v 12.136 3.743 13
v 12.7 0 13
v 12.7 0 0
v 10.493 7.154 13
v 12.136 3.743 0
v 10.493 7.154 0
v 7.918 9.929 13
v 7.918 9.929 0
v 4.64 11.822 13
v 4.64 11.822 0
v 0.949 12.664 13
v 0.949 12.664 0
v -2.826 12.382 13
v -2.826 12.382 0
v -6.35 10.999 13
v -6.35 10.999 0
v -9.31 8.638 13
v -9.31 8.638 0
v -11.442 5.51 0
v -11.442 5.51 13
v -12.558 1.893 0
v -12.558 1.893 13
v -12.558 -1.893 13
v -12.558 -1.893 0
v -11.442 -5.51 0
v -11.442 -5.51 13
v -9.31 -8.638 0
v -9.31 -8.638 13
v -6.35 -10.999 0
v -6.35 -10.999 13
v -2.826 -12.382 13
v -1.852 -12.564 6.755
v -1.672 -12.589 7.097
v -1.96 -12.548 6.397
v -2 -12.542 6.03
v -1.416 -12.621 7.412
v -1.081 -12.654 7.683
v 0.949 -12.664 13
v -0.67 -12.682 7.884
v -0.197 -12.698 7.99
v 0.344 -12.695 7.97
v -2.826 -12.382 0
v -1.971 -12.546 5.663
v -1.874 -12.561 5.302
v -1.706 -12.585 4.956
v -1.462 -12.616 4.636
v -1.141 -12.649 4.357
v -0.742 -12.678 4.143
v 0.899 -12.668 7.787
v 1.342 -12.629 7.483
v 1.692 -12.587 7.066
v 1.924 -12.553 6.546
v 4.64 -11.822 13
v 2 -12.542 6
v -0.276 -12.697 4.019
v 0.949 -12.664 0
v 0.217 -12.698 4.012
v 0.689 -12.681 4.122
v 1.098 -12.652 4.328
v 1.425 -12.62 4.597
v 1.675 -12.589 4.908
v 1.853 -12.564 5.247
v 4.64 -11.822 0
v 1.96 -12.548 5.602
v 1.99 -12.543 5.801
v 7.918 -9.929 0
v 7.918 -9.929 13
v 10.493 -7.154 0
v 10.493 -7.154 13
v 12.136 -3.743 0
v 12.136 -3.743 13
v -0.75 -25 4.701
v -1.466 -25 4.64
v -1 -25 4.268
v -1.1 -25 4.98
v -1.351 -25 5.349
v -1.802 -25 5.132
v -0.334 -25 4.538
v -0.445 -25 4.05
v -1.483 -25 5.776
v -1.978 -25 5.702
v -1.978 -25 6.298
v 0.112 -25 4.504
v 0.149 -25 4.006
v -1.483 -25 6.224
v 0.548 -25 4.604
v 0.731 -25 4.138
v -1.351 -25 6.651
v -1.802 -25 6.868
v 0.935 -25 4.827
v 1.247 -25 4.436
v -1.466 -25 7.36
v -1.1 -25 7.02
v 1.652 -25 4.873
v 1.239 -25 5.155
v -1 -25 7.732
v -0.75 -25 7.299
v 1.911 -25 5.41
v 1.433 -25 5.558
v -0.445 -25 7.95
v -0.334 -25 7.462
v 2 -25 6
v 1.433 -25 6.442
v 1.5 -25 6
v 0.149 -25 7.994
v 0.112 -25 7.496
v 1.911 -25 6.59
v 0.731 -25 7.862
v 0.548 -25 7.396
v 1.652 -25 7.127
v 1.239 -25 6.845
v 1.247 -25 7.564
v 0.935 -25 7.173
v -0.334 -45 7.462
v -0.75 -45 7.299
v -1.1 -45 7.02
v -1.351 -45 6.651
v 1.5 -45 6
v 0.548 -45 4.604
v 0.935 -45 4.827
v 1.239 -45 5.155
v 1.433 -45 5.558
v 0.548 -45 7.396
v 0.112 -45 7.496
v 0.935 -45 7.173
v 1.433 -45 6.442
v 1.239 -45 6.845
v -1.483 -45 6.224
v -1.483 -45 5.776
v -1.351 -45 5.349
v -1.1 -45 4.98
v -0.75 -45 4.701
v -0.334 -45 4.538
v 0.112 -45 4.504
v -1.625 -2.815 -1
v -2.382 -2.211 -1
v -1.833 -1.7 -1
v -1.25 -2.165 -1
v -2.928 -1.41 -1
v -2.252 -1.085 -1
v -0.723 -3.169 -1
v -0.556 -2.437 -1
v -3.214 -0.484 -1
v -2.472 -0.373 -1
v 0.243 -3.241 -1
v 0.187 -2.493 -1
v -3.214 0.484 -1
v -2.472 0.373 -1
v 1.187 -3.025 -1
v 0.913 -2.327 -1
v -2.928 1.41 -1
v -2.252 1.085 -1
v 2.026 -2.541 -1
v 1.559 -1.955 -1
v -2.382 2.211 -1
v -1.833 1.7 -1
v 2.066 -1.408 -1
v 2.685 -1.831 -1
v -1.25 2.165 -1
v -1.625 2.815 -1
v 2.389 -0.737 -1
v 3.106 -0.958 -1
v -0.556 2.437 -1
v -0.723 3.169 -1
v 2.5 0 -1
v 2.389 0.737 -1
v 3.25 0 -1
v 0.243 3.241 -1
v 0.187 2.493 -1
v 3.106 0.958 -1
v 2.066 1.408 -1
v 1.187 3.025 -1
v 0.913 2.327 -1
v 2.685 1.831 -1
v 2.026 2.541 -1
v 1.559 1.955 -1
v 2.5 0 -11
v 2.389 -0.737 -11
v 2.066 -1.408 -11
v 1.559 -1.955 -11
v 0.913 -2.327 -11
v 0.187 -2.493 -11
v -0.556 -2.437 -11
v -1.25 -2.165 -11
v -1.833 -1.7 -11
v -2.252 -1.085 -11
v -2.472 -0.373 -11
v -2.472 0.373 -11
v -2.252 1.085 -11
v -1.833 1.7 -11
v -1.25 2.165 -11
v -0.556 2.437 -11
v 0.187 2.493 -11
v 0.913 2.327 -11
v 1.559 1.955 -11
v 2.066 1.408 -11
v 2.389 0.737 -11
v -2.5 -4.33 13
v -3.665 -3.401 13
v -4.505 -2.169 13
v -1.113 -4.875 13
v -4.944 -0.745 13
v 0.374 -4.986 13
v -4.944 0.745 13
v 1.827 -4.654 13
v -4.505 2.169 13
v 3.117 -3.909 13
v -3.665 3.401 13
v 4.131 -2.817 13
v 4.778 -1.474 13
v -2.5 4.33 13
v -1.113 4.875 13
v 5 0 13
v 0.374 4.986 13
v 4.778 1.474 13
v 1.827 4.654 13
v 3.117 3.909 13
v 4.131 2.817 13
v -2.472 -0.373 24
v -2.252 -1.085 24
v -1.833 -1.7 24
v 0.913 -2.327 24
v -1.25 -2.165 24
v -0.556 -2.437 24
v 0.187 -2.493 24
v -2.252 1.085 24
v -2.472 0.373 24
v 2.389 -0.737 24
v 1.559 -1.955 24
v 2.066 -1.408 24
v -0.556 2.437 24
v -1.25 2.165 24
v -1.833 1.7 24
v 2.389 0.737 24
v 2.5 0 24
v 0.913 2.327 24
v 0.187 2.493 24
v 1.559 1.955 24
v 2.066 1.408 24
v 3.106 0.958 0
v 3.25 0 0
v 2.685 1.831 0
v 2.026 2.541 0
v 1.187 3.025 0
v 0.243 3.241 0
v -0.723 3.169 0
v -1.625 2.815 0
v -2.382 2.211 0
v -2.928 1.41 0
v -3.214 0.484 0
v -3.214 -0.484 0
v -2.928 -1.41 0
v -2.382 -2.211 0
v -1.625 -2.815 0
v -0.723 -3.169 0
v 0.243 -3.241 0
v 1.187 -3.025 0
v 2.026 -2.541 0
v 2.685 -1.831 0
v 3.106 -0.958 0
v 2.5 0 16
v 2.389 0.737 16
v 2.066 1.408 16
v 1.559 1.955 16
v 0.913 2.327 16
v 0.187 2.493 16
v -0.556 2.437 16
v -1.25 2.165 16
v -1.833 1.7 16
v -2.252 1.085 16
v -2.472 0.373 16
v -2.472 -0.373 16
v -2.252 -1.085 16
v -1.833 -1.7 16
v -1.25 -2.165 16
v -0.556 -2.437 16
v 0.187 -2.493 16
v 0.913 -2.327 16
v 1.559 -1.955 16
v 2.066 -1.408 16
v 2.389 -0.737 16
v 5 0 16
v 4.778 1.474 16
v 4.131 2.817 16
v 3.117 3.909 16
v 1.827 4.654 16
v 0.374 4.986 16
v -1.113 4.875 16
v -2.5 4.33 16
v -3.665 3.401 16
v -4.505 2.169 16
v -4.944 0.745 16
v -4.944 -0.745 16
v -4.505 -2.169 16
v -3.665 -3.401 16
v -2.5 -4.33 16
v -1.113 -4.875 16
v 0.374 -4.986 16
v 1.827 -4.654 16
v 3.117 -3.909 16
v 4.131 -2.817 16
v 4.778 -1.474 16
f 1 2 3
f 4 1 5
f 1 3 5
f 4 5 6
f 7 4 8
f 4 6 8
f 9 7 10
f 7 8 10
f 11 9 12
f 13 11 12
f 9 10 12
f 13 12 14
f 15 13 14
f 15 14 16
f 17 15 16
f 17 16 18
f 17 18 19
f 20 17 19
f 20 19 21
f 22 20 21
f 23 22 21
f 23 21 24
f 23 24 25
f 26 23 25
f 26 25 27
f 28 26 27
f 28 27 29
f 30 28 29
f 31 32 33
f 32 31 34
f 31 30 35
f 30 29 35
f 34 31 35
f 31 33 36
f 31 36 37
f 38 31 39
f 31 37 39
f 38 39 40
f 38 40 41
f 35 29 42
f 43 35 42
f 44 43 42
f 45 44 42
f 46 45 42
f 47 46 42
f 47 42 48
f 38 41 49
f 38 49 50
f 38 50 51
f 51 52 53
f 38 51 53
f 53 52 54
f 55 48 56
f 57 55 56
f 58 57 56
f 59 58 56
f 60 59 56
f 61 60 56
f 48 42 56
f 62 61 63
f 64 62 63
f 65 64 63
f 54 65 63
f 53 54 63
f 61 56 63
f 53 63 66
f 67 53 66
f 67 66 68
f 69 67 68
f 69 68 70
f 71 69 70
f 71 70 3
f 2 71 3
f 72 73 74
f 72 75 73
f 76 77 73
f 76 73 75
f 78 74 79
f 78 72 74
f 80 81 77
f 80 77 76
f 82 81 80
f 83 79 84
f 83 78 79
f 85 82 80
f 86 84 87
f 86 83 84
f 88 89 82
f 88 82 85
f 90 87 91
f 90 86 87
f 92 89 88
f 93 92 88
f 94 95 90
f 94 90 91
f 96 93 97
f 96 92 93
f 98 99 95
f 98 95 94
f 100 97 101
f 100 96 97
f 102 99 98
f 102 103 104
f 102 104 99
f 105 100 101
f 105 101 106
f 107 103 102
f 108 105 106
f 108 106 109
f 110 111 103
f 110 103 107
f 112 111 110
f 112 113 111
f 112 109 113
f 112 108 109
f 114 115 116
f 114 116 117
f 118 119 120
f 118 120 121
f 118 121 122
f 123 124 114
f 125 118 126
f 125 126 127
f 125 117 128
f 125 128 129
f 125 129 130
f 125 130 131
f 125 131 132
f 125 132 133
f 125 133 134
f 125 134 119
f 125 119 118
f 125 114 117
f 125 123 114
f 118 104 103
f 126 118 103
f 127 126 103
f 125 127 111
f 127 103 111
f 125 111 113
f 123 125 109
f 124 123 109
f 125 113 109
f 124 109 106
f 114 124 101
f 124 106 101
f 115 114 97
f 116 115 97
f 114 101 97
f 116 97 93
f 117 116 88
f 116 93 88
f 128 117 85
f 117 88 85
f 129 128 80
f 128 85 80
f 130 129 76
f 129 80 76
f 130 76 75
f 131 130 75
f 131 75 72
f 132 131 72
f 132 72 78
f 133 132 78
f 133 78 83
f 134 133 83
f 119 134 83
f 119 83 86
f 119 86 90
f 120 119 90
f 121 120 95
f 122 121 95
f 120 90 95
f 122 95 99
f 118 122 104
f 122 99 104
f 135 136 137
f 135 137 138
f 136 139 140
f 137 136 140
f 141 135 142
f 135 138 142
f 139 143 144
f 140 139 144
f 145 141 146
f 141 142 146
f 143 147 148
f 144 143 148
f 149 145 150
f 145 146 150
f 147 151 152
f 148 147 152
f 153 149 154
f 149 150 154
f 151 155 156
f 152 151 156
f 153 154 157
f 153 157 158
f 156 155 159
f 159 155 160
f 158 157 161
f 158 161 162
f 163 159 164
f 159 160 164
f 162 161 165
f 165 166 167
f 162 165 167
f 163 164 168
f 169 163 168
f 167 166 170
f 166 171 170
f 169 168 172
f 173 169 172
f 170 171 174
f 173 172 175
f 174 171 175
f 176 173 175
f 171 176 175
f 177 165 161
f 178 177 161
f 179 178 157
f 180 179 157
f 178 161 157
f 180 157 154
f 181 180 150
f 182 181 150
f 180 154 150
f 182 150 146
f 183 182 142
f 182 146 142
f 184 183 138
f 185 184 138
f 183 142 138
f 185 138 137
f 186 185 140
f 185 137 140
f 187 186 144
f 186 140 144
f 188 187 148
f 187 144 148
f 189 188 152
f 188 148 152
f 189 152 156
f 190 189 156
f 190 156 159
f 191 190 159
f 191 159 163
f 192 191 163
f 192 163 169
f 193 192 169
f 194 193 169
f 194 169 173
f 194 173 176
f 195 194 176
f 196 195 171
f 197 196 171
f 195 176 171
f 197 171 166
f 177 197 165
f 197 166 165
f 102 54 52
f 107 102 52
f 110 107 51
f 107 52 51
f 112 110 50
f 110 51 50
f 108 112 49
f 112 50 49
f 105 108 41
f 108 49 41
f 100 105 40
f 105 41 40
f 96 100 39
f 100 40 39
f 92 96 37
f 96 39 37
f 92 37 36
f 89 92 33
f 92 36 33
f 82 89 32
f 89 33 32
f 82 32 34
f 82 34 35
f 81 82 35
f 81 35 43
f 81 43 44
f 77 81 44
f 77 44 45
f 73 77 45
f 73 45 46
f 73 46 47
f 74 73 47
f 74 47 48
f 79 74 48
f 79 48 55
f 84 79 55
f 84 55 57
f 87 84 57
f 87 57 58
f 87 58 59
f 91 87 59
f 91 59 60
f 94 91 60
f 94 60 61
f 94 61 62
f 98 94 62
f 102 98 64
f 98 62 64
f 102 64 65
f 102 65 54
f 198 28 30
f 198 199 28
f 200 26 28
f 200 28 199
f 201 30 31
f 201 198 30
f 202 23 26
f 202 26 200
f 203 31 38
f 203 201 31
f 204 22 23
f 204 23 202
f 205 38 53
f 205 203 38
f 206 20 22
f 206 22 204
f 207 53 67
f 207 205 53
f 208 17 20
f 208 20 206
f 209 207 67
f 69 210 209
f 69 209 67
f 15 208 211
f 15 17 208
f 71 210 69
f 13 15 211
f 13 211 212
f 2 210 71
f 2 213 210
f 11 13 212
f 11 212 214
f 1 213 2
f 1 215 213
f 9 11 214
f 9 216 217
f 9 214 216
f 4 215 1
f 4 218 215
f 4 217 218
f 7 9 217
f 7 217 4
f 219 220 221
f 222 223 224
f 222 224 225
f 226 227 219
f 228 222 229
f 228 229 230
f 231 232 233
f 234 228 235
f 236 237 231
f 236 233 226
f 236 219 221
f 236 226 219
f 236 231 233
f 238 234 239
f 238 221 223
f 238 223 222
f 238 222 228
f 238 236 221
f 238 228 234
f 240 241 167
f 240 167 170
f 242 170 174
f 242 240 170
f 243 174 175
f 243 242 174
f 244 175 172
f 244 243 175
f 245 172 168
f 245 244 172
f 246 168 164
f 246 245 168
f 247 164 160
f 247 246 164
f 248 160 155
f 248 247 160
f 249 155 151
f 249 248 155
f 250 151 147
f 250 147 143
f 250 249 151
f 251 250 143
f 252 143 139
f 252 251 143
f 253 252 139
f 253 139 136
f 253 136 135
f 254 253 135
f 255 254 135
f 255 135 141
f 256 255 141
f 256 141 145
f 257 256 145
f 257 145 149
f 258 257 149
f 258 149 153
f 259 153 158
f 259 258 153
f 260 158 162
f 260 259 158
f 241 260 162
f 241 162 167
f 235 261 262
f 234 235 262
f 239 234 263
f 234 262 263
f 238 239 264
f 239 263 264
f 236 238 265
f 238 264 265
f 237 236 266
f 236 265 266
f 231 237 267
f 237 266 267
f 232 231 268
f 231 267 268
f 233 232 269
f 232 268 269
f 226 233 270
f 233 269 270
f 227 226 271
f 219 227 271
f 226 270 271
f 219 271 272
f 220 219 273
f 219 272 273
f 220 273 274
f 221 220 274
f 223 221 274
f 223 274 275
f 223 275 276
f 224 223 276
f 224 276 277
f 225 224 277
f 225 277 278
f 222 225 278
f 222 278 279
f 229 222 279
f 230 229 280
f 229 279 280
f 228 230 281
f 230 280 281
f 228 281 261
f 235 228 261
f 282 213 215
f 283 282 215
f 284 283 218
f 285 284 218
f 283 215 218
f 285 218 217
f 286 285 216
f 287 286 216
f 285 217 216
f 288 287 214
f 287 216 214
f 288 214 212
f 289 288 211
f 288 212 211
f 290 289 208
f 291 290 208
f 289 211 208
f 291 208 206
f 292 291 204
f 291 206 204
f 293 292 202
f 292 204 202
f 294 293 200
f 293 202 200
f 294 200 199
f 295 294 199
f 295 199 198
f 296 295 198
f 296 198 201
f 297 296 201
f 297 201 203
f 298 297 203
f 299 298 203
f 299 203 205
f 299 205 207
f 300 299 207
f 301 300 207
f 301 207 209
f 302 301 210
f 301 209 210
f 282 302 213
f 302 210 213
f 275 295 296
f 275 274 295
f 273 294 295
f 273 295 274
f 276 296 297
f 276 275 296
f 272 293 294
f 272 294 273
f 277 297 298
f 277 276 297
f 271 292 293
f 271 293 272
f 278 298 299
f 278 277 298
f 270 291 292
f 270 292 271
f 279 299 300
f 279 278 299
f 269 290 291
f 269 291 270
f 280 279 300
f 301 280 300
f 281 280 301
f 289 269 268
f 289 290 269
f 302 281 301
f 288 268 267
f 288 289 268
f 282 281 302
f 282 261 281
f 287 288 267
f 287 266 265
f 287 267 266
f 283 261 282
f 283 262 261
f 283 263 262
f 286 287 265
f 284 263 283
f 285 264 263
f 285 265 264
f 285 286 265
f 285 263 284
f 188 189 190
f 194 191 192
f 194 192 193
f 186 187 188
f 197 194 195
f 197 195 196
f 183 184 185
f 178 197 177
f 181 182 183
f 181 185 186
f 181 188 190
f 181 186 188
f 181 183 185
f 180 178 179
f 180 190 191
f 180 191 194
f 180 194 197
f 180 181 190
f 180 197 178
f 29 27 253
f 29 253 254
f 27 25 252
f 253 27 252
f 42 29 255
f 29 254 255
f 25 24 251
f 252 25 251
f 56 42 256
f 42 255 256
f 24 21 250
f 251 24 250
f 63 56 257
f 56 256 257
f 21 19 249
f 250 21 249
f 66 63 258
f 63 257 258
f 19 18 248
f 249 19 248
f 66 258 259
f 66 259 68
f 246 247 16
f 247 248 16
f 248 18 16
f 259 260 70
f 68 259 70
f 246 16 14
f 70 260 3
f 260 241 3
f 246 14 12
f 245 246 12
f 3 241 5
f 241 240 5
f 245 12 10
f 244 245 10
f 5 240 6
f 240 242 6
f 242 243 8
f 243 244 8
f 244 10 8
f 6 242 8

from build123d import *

# Parameters (mm, degrees)
SKETCH_R     = 12.7
PAD_DEPTH    = 13
SKETCH001_R  = 5
PAD001_DEPTH = 3
SKETCH002_R  = 2.5
PAD002_DEPTH = 8
SKETCH003_R  = 3.25
PAD003_DEPTH = 1
SKETCH004_R  = 2.5
PAD004_DEPTH = 10
SKETCH005_R  = 2
PAD005_DEPTH = 25
SKETCH006_R  = 1.5
PAD006_DEPTH = 20


with BuildPart() as part:
    # Sketch → Pad (new body)
    with BuildSketch(Plane.XY):
        Circle(SKETCH_R)
    extrude(amount=PAD_DEPTH)

    # Sketch001 (on Face3 of Pad) → Pad001 (join)
    with BuildSketch(Plane.XY.offset(13)):
        Circle(SKETCH001_R)
    extrude(amount=PAD001_DEPTH)

    # Sketch002 (on Face5 of Pad001) → Pad002 (join)
    with BuildSketch(Plane.XY.offset(16)):
        Circle(SKETCH002_R)
    extrude(amount=PAD002_DEPTH)

    # Sketch003 → Pad003 (join)
    with BuildSketch(Plane.XY):
        Circle(SKETCH003_R)
    extrude(amount=-PAD003_DEPTH)

    # Sketch004 (on Face6 of Pad003) → Pad004 (join)
    with BuildSketch(Plane(origin=(0, 0, -1), x_dir=(1, 0, 0), z_dir=(0, 0, -1))):
        Circle(SKETCH004_R)
    extrude(amount=PAD004_DEPTH)

    # Sketch005 → Pad005 (join)
    with BuildSketch(Plane.XZ):
        with Locations((0, 6)):
            Circle(SKETCH005_R)
    extrude(amount=PAD005_DEPTH)

    # Sketch006 (on Face7 of Pad005) → Pad006 (join)
    with BuildSketch(Plane.XZ.offset(25)):
        with Locations((0, 6)):
            Circle(SKETCH006_R)
    extrude(amount=PAD006_DEPTH)


solid = part.part
